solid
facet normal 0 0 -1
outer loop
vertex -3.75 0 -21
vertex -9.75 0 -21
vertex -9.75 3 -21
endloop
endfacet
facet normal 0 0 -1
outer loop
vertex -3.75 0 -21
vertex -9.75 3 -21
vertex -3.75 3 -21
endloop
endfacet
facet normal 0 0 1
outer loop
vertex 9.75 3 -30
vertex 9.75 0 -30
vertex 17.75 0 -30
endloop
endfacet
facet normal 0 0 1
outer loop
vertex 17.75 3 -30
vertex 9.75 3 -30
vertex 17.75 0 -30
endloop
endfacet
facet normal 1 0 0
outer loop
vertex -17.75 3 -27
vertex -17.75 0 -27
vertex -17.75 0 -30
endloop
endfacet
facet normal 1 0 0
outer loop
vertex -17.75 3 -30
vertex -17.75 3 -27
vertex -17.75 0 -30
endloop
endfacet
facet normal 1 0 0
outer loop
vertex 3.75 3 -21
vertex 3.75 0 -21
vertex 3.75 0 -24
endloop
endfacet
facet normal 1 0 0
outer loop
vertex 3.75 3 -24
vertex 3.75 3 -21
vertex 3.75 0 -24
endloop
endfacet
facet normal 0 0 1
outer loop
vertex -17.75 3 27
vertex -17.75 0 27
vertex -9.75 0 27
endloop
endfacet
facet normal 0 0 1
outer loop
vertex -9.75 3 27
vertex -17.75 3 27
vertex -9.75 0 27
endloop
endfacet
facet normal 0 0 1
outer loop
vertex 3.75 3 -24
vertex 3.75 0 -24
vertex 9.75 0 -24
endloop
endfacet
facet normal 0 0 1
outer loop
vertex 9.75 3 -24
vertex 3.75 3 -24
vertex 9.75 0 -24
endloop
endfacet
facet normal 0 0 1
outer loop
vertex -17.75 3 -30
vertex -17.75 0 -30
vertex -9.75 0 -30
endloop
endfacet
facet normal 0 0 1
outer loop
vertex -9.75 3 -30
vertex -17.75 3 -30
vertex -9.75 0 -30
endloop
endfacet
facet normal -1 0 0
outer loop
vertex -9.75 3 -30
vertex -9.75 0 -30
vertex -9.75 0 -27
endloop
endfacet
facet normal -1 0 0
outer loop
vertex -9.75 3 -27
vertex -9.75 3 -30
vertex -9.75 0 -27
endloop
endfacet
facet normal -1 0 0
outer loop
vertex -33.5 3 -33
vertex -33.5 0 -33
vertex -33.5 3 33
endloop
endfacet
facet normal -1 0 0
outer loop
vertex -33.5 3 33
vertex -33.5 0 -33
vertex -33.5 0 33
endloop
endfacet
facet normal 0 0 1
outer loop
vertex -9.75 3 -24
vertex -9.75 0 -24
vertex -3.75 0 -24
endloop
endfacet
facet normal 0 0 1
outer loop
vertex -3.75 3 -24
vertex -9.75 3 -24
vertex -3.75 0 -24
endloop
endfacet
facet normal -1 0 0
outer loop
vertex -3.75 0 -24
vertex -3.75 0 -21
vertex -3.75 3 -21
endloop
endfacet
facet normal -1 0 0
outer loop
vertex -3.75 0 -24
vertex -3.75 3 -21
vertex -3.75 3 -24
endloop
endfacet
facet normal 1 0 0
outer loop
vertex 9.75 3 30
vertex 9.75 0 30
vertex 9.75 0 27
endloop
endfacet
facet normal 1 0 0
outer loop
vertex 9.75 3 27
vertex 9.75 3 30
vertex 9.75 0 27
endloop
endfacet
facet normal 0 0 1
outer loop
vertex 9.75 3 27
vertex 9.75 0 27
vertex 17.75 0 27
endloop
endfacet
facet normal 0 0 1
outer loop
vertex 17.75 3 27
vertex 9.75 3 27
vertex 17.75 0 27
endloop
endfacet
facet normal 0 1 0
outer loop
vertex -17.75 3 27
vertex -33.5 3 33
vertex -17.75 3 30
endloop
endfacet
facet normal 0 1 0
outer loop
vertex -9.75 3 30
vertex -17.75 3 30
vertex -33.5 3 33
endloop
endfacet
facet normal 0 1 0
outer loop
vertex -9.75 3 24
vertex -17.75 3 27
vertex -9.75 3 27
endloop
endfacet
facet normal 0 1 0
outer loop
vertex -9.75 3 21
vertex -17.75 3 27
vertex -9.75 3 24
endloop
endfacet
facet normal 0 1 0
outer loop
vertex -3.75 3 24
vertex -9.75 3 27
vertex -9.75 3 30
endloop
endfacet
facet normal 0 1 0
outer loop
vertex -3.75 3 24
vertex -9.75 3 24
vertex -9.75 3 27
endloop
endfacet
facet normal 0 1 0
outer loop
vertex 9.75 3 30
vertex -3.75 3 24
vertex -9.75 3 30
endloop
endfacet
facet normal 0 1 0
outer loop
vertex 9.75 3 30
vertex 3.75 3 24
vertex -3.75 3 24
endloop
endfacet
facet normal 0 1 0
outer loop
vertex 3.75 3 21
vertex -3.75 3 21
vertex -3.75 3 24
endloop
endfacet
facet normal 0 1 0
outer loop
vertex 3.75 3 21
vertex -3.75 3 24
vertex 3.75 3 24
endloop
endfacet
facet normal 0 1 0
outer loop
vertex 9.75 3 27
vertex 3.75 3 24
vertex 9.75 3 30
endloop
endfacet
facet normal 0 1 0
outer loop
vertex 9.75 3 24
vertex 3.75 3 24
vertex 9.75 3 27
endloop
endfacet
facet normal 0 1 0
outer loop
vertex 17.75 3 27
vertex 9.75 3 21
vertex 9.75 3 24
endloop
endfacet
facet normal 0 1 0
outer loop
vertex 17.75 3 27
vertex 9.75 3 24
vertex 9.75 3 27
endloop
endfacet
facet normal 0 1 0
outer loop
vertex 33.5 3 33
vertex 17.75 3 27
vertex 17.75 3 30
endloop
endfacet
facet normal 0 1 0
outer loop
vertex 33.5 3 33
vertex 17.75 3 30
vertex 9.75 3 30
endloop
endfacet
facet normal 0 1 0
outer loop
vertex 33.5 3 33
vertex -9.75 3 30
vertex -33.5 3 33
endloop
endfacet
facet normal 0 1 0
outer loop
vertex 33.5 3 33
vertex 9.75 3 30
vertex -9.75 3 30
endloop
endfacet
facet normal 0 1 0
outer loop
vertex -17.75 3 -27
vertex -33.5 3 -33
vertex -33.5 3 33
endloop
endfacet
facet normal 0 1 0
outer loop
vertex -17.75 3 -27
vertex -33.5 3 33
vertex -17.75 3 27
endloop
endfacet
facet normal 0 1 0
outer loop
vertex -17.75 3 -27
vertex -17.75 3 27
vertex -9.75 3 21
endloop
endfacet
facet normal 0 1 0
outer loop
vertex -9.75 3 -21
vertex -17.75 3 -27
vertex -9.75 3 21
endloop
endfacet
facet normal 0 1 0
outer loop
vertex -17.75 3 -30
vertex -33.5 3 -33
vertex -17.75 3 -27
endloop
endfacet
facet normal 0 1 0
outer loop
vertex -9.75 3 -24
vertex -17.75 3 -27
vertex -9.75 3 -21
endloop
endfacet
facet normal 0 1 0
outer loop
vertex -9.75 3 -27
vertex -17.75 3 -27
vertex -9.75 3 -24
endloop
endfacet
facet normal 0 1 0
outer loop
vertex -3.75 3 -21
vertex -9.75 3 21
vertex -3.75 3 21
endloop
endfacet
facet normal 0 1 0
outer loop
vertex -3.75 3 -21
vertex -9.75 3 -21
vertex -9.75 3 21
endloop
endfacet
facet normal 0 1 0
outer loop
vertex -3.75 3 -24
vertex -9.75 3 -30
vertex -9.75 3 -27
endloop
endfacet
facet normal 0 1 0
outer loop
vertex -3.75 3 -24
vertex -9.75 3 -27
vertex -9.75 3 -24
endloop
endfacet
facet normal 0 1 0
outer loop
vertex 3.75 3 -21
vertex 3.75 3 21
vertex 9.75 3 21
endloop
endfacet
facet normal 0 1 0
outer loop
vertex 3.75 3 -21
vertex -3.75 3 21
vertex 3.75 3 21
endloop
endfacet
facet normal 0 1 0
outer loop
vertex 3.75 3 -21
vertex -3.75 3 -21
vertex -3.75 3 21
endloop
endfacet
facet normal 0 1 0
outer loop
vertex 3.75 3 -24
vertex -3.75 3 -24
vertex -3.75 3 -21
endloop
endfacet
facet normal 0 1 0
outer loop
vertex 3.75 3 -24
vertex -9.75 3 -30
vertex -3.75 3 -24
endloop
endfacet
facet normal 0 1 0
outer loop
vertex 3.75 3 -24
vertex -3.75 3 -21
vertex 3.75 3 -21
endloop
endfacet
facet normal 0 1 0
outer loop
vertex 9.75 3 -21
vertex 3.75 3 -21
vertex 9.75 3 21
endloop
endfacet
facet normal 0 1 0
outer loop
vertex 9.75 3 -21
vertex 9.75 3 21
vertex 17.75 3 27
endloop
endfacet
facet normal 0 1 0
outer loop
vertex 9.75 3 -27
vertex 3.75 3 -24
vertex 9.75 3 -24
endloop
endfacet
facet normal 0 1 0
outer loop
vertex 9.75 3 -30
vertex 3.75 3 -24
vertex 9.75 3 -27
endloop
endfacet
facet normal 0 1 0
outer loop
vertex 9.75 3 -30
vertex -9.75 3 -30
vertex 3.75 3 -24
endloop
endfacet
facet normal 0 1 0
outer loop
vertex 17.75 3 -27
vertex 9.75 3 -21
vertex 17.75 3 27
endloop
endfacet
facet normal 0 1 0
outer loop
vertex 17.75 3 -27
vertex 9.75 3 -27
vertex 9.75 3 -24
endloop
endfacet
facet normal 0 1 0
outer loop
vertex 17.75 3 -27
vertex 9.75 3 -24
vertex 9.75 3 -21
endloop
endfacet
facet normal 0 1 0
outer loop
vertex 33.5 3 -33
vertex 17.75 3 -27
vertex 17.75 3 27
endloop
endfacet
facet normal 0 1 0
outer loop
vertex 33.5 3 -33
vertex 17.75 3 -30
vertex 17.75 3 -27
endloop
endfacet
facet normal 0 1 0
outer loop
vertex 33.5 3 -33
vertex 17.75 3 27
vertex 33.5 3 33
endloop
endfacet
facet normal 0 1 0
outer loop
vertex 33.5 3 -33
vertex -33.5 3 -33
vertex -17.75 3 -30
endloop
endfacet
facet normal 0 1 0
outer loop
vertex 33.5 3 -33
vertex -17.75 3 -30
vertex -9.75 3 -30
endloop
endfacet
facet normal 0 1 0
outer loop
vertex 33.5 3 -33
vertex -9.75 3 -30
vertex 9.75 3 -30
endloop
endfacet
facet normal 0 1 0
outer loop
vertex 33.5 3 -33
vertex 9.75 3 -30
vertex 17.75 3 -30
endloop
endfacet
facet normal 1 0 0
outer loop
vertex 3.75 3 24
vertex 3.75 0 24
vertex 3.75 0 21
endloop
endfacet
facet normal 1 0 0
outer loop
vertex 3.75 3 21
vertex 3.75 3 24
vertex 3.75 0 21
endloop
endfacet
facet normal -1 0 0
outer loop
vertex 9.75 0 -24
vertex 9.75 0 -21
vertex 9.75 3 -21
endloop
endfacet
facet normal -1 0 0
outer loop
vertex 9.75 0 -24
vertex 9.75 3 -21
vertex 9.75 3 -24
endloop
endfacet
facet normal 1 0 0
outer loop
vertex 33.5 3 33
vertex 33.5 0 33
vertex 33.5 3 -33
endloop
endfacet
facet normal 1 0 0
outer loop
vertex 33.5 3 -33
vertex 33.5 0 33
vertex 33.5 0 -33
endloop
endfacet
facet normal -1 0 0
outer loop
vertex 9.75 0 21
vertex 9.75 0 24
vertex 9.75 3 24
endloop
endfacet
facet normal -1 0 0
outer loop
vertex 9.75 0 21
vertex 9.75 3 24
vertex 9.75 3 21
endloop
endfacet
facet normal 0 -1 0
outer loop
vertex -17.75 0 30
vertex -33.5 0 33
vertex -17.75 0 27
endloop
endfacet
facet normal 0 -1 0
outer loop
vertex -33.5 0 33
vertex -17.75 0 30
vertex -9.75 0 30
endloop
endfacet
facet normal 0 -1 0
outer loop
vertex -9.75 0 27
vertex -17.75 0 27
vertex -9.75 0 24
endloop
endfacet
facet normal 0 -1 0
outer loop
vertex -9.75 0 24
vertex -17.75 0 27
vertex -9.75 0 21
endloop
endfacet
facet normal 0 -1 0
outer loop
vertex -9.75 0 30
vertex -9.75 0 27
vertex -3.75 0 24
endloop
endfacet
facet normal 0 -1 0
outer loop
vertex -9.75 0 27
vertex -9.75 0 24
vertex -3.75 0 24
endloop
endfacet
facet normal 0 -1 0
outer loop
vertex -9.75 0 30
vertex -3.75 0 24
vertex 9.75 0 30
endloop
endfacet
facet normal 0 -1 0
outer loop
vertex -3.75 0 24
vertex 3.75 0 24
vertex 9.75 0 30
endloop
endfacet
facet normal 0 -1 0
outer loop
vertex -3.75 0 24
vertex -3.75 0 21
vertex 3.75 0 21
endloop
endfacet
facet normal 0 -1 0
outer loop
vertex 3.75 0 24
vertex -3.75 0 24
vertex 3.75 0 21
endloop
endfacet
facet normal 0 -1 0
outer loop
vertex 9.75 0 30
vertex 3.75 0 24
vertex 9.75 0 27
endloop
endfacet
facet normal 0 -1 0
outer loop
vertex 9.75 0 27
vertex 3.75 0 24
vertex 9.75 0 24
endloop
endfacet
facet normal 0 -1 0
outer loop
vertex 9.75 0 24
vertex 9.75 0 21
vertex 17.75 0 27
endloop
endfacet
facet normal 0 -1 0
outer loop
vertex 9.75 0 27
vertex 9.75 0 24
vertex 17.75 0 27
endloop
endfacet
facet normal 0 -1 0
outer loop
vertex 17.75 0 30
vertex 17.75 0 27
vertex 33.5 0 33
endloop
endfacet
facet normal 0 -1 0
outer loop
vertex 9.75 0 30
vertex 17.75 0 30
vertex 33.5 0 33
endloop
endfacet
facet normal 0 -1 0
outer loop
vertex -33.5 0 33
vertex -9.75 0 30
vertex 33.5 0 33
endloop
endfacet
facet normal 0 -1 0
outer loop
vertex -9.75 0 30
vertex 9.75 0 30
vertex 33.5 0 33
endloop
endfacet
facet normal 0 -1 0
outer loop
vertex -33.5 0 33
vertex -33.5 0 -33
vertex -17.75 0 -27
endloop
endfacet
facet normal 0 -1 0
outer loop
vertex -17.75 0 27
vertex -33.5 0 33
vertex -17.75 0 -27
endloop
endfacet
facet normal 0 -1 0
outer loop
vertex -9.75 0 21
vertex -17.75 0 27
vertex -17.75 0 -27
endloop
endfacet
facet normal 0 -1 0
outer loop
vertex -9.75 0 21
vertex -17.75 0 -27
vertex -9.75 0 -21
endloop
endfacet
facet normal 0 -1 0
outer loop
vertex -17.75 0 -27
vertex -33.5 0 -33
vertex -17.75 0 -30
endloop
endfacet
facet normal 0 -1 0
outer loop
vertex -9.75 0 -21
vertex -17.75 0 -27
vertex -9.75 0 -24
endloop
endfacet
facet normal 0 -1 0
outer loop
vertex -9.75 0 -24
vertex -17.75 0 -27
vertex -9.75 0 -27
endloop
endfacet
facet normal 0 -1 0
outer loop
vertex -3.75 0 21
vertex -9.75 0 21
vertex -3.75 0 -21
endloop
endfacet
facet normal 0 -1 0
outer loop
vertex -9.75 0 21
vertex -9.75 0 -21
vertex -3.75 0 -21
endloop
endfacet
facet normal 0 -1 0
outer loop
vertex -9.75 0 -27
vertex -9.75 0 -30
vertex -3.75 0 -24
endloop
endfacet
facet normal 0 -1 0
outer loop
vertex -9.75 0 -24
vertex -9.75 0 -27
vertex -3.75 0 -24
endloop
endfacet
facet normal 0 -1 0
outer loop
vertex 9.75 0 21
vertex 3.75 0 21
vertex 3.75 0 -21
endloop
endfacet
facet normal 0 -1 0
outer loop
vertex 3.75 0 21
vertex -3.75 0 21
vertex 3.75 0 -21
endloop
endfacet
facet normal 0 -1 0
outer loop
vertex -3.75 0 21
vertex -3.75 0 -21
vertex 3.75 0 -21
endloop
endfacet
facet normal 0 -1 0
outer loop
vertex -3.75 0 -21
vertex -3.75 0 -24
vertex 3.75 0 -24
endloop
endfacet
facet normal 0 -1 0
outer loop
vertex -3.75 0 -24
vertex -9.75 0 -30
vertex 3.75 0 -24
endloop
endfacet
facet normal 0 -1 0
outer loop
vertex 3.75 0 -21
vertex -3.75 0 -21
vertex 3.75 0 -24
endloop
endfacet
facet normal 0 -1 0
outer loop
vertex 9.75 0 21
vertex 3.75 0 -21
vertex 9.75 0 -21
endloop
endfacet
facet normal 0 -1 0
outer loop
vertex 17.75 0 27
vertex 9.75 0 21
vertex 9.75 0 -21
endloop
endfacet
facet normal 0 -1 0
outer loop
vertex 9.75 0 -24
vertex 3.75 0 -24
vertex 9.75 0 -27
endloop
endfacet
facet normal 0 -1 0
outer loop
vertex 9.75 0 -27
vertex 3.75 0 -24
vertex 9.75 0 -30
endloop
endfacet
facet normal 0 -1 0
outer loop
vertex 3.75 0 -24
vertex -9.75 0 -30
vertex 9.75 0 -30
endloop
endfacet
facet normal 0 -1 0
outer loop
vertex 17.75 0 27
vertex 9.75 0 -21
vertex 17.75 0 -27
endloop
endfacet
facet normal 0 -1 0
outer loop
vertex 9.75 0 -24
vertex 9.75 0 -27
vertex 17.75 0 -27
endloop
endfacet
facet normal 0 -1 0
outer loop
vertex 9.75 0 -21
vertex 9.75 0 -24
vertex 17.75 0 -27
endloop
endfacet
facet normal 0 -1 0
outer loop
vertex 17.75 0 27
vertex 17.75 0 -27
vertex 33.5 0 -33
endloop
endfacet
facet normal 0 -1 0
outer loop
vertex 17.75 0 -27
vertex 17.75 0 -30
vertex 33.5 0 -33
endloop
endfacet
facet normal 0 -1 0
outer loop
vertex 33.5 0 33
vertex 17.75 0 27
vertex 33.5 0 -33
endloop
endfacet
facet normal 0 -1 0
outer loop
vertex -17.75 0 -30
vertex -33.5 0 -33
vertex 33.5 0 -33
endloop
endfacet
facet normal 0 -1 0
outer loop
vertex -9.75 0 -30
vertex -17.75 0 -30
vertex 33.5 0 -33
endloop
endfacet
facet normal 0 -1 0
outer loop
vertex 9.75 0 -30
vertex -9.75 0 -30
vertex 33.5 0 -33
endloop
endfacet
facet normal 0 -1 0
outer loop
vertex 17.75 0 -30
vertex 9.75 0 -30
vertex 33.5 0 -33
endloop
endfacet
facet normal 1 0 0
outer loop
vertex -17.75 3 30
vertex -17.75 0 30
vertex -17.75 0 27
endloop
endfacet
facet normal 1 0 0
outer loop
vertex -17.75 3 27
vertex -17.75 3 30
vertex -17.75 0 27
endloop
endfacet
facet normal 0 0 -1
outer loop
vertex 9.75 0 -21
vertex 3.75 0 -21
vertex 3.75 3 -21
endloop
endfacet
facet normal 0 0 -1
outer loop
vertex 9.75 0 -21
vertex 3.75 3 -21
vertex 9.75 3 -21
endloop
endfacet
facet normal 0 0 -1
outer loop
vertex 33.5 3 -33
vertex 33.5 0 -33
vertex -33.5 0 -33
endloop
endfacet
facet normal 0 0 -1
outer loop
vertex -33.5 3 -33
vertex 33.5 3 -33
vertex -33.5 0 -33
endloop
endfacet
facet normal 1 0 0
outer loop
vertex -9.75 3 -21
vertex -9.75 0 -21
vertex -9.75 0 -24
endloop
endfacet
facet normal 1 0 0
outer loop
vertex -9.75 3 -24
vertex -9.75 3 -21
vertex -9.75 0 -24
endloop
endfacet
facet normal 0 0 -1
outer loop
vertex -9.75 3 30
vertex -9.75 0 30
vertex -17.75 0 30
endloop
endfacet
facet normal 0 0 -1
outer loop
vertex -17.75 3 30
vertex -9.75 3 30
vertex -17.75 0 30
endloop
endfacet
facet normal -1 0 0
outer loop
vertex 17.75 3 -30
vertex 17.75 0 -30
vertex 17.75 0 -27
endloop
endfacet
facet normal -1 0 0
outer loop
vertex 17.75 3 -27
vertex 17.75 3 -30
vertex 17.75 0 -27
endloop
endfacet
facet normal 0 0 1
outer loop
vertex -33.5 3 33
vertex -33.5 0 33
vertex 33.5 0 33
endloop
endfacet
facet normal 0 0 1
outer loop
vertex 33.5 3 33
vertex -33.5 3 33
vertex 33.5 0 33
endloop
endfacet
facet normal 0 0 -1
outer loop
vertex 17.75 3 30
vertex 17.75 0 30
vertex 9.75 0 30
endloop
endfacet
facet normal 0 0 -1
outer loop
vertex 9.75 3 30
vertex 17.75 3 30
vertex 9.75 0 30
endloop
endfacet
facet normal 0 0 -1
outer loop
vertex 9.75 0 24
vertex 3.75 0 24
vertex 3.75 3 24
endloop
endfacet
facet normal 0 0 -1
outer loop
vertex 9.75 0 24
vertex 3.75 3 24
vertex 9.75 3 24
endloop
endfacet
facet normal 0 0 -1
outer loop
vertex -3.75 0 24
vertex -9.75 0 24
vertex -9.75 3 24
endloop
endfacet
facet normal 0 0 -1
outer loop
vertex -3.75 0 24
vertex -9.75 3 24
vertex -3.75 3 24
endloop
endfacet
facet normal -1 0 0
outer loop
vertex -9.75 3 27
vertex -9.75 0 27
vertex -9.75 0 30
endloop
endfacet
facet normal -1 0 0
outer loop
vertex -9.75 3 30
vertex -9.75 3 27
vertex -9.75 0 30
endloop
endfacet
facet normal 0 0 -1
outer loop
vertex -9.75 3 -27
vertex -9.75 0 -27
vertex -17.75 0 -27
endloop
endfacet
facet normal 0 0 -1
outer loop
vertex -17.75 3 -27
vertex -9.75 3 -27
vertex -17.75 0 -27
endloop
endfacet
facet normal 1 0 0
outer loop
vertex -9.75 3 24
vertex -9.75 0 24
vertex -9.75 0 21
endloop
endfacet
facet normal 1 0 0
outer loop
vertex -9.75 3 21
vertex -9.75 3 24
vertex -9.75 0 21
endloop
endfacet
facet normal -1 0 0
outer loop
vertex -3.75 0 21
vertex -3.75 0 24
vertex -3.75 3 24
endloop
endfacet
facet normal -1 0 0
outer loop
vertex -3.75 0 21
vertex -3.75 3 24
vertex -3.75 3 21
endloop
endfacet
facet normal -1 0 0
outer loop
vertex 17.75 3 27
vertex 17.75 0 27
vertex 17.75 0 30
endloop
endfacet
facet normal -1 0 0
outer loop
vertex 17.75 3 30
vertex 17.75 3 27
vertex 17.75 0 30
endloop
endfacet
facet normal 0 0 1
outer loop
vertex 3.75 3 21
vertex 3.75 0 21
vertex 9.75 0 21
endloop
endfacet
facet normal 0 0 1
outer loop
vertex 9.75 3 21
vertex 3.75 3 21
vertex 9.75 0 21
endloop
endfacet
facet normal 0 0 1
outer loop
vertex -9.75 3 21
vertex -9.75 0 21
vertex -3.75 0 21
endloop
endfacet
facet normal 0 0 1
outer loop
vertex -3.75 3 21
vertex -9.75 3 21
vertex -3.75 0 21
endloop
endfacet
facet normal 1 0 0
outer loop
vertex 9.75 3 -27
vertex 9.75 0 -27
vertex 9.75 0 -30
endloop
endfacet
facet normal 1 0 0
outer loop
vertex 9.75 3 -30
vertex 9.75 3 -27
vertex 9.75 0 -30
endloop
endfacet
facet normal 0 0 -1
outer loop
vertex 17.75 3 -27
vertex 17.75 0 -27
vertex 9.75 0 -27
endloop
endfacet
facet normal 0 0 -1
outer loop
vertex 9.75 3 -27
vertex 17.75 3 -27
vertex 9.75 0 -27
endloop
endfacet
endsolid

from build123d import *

# Parameters (mm, degrees)
ESBO_O1_W                = 6
ESBO_O1_H                = 3
RESSALTO_EXTRUS_O1_DEPTH = 3


with BuildPart() as part:
    # Esboço1 → Ressalto-extrusão1 (new body)
    with BuildSketch(Plane(origin=(0, 0, 0), x_dir=(1, 0, 0), z_dir=(0, 1, 0))):
        Polygon((-33.5, 28), (-33.5, -27.5), (-33.5, -28), (-33.5, -33), (-9.75, -33), (33.5, -33), (33.5, -28), (33.5, -27.5), (33.5, 28), (33.5, 33), (-9.75, 33), (-33.5, 33), align=None)
        Polygon((-16.929303449, -27), (-9.75, -27), (-9.75, -28.5), (-9.75, -30), (-17.75, -30), (-17.75, -27), align=None, mode=Mode.SUBTRACT)
        with Locations((-6.75, -22.5)):
            Rectangle(ESBO_O1_W, ESBO_O1_H, mode=Mode.SUBTRACT)
        Polygon((9.75, -28.5), (9.75, -27), (17.75, -27), (17.75, -30), (9.75, -30), align=None, mode=Mode.SUBTRACT)
        with Locations((6.75, -22.5)):
            Rectangle(ESBO_O1_W, ESBO_O1_H, mode=Mode.SUBTRACT)
        with Locations((-6.75, 22.5)):
            Rectangle(ESBO_O1_W, ESBO_O1_H, mode=Mode.SUBTRACT)
        Polygon((-9.75, 28.5), (-9.75, 27), (-16.929303449, 27), (-17.75, 27), (-17.75, 30), (-9.75, 30), align=None, mode=Mode.SUBTRACT)
        with Locations((6.75, 22.5)):
            Rectangle(ESBO_O1_W, ESBO_O1_H, mode=Mode.SUBTRACT)
        Polygon((9.75, 27), (9.75, 28.5), (9.75, 30), (17.75, 30), (17.75, 27), align=None, mode=Mode.SUBTRACT)
    extrude(amount=RESSALTO_EXTRUS_O1_DEPTH)


solid = part.part
